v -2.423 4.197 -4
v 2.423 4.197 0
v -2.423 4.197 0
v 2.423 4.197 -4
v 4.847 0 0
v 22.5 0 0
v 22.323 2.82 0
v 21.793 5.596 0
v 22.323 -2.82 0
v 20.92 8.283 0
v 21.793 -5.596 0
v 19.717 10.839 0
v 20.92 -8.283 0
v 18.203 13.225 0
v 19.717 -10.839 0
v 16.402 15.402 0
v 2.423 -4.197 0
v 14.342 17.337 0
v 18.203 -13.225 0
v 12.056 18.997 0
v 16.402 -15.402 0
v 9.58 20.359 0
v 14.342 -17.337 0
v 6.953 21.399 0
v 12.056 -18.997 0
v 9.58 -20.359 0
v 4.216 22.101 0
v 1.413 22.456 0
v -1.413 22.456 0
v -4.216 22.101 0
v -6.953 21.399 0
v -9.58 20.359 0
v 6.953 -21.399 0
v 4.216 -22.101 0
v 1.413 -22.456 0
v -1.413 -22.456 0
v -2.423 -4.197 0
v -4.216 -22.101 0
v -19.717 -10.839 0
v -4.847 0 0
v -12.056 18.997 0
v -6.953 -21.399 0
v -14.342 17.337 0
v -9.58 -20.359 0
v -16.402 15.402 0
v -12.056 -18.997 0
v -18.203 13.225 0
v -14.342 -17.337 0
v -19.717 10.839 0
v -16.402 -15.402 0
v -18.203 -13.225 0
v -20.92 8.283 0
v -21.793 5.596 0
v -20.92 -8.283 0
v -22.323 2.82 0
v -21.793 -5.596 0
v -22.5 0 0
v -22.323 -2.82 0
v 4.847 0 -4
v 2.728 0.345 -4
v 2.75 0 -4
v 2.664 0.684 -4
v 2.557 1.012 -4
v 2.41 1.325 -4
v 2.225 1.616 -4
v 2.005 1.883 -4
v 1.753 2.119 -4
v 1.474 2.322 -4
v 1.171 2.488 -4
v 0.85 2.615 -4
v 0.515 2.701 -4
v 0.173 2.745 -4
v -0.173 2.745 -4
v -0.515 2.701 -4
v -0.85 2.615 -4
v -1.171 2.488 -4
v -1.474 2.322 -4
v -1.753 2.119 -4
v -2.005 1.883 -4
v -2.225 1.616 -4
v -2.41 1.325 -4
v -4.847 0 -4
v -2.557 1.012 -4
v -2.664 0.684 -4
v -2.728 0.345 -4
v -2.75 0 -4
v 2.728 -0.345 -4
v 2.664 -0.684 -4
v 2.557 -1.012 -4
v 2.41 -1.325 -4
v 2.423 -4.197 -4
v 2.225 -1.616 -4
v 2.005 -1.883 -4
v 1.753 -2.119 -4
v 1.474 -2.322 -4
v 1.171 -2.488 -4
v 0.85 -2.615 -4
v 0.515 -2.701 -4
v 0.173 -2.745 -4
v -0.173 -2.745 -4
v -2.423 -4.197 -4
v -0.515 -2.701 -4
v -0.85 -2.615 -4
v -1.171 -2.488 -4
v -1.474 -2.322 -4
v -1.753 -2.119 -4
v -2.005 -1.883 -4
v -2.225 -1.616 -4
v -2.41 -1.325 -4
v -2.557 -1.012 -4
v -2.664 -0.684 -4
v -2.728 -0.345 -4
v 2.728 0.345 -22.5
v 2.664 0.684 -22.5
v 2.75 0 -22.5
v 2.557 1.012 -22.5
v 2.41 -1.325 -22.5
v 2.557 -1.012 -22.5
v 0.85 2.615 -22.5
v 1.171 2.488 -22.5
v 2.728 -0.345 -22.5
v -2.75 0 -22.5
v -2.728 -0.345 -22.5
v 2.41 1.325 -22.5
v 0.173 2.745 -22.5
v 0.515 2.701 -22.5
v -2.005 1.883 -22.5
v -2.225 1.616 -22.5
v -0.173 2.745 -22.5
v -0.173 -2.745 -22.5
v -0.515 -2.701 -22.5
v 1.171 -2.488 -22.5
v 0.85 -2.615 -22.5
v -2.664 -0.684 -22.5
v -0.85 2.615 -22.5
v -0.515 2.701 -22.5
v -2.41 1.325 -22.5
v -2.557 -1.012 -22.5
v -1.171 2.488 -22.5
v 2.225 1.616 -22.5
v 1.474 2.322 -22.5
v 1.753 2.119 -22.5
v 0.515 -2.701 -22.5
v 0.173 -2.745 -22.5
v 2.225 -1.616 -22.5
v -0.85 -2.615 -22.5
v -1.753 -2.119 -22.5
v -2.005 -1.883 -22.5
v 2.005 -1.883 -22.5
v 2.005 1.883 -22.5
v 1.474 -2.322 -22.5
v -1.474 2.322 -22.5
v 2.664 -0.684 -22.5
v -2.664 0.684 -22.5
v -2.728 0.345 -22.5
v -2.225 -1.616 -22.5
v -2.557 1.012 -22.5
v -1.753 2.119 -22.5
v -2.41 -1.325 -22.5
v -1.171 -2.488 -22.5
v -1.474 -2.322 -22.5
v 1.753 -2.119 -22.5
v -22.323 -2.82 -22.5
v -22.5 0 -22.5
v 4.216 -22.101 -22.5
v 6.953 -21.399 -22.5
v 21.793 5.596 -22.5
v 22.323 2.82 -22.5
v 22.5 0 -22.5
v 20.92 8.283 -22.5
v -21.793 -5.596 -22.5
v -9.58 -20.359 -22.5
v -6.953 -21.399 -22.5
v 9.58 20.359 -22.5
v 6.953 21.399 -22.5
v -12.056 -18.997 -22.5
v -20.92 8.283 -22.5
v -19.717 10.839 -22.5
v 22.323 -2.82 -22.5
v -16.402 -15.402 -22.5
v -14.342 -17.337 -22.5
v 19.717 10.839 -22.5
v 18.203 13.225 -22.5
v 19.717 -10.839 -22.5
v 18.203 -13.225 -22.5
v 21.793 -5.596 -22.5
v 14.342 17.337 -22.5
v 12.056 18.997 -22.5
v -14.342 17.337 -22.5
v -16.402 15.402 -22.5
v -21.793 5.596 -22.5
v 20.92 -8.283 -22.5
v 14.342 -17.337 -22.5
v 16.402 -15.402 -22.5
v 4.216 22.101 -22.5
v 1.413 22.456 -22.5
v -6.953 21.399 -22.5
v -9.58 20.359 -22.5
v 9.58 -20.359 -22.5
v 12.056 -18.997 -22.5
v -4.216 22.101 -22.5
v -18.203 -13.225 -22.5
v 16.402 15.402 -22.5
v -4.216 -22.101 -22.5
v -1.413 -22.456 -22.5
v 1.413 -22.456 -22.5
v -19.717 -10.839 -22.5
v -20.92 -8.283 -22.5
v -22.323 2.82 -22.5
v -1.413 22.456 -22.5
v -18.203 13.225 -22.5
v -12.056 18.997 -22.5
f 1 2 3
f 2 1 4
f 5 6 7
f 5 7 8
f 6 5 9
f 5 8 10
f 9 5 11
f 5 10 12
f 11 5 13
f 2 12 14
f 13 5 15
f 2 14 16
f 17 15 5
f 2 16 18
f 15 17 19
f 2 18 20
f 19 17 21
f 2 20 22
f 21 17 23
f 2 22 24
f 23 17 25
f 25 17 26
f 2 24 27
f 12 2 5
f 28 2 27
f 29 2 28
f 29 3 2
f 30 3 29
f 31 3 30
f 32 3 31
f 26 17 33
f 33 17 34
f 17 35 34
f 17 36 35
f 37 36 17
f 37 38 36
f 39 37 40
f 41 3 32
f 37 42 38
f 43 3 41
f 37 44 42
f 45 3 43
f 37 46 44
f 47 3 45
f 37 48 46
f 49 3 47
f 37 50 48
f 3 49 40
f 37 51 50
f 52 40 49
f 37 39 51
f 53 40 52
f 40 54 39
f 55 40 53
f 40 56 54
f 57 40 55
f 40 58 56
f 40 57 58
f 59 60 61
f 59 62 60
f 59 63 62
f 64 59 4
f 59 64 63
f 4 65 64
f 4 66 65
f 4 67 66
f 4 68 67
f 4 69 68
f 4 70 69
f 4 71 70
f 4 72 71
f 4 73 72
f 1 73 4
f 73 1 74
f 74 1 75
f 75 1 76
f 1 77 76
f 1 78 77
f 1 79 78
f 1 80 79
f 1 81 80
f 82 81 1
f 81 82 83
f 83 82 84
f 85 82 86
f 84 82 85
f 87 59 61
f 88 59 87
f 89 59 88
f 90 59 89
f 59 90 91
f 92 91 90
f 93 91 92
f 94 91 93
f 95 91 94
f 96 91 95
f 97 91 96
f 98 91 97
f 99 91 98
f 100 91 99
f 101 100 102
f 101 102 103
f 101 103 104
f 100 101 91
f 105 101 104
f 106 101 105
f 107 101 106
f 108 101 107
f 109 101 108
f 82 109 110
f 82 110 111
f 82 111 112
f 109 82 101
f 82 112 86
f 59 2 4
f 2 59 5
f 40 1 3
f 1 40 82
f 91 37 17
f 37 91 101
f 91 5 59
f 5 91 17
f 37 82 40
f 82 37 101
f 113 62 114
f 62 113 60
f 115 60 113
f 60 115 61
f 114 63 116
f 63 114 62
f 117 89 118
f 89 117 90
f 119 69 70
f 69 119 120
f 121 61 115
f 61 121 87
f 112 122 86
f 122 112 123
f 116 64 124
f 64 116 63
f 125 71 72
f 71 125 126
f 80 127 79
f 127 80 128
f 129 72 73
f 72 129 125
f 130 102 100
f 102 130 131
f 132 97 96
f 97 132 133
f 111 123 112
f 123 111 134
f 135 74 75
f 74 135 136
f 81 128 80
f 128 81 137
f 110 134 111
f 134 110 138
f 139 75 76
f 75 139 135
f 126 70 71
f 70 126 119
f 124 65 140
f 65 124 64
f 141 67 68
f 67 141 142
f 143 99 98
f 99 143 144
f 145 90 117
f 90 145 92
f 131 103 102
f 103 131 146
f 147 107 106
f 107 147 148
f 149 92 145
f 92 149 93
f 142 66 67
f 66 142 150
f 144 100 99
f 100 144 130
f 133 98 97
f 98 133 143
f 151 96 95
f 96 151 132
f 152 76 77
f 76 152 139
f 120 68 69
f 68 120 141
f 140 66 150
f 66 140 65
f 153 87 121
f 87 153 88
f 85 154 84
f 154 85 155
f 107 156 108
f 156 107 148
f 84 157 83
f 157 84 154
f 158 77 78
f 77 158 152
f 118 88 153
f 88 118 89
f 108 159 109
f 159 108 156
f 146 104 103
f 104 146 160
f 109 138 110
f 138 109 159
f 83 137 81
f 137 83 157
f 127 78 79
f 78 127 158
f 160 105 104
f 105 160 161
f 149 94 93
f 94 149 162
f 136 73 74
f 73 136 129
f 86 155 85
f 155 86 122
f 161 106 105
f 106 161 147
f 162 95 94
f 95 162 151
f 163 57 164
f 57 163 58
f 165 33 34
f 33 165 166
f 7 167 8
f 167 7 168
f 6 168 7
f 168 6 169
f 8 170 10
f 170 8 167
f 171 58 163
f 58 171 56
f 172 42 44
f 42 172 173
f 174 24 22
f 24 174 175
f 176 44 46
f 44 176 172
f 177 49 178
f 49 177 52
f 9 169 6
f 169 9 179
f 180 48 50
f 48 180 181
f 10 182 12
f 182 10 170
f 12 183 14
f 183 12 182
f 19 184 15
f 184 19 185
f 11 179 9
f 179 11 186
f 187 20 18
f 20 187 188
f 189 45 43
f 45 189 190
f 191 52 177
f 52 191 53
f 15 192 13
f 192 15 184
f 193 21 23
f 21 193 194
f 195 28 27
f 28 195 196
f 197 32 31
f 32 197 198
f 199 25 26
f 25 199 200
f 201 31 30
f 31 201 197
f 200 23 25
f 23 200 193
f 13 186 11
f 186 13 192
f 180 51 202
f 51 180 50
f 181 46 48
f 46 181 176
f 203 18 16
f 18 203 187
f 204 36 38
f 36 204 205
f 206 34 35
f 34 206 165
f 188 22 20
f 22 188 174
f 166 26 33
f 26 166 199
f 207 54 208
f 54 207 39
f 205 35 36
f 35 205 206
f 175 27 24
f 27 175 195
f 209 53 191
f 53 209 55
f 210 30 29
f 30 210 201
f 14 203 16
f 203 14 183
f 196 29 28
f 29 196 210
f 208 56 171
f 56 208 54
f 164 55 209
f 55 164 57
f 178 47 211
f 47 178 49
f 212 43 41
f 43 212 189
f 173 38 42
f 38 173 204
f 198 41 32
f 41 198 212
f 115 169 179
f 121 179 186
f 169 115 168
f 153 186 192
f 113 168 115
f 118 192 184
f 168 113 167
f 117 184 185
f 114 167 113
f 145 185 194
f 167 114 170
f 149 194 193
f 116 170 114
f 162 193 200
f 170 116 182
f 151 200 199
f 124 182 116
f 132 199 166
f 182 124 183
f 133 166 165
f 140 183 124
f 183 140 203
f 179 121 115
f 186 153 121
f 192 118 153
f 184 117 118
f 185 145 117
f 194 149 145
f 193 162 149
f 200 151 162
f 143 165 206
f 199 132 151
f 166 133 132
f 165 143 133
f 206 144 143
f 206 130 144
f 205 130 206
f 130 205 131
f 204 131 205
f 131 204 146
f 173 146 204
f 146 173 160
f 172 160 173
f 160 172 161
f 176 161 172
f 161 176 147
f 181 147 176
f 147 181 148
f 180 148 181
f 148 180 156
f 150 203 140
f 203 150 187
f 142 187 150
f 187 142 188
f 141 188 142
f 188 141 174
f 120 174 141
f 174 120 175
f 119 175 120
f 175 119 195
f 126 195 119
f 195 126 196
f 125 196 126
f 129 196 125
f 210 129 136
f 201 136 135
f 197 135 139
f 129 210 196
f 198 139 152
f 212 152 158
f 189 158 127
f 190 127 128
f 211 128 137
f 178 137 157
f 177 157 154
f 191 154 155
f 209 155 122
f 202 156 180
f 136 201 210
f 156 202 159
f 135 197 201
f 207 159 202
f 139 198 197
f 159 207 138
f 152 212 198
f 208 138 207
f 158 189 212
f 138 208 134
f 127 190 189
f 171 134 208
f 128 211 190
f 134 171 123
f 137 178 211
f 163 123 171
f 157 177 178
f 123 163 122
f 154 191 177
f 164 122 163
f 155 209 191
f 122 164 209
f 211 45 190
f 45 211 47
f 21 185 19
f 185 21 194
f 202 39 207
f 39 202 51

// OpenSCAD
$fn = 50;


difference() {
	union() {
		translate(v = [0, 0, -22.5000000000]) {
			cylinder(h = 22.5000000000, r = 22.5000000000);
		}
	}
	union() {
		translate(v = [0, 0, 0]) {
			rotate(a = [0, 0, 0]) {
				difference() {
					union() {
						translate(v = [0, 0, -4]) {
							linear_extrude(height = 4) {
								polygon(points = [[4.8468000000, 0.0000000000], [2.4234000000, 4.1974519271], [-2.4234000000, 4.1974519271], [-4.8468000000, 0.0000000000], [-2.4234000000, -4.1974519271], [2.4234000000, -4.1974519271]]);
							}
						}
					}
					union();
				}
			}
		}
		#translate(v = [0, 0, -100.0000000000]) {
			cylinder(h = 200, r = 2.7500000000);
		}
	}
}
